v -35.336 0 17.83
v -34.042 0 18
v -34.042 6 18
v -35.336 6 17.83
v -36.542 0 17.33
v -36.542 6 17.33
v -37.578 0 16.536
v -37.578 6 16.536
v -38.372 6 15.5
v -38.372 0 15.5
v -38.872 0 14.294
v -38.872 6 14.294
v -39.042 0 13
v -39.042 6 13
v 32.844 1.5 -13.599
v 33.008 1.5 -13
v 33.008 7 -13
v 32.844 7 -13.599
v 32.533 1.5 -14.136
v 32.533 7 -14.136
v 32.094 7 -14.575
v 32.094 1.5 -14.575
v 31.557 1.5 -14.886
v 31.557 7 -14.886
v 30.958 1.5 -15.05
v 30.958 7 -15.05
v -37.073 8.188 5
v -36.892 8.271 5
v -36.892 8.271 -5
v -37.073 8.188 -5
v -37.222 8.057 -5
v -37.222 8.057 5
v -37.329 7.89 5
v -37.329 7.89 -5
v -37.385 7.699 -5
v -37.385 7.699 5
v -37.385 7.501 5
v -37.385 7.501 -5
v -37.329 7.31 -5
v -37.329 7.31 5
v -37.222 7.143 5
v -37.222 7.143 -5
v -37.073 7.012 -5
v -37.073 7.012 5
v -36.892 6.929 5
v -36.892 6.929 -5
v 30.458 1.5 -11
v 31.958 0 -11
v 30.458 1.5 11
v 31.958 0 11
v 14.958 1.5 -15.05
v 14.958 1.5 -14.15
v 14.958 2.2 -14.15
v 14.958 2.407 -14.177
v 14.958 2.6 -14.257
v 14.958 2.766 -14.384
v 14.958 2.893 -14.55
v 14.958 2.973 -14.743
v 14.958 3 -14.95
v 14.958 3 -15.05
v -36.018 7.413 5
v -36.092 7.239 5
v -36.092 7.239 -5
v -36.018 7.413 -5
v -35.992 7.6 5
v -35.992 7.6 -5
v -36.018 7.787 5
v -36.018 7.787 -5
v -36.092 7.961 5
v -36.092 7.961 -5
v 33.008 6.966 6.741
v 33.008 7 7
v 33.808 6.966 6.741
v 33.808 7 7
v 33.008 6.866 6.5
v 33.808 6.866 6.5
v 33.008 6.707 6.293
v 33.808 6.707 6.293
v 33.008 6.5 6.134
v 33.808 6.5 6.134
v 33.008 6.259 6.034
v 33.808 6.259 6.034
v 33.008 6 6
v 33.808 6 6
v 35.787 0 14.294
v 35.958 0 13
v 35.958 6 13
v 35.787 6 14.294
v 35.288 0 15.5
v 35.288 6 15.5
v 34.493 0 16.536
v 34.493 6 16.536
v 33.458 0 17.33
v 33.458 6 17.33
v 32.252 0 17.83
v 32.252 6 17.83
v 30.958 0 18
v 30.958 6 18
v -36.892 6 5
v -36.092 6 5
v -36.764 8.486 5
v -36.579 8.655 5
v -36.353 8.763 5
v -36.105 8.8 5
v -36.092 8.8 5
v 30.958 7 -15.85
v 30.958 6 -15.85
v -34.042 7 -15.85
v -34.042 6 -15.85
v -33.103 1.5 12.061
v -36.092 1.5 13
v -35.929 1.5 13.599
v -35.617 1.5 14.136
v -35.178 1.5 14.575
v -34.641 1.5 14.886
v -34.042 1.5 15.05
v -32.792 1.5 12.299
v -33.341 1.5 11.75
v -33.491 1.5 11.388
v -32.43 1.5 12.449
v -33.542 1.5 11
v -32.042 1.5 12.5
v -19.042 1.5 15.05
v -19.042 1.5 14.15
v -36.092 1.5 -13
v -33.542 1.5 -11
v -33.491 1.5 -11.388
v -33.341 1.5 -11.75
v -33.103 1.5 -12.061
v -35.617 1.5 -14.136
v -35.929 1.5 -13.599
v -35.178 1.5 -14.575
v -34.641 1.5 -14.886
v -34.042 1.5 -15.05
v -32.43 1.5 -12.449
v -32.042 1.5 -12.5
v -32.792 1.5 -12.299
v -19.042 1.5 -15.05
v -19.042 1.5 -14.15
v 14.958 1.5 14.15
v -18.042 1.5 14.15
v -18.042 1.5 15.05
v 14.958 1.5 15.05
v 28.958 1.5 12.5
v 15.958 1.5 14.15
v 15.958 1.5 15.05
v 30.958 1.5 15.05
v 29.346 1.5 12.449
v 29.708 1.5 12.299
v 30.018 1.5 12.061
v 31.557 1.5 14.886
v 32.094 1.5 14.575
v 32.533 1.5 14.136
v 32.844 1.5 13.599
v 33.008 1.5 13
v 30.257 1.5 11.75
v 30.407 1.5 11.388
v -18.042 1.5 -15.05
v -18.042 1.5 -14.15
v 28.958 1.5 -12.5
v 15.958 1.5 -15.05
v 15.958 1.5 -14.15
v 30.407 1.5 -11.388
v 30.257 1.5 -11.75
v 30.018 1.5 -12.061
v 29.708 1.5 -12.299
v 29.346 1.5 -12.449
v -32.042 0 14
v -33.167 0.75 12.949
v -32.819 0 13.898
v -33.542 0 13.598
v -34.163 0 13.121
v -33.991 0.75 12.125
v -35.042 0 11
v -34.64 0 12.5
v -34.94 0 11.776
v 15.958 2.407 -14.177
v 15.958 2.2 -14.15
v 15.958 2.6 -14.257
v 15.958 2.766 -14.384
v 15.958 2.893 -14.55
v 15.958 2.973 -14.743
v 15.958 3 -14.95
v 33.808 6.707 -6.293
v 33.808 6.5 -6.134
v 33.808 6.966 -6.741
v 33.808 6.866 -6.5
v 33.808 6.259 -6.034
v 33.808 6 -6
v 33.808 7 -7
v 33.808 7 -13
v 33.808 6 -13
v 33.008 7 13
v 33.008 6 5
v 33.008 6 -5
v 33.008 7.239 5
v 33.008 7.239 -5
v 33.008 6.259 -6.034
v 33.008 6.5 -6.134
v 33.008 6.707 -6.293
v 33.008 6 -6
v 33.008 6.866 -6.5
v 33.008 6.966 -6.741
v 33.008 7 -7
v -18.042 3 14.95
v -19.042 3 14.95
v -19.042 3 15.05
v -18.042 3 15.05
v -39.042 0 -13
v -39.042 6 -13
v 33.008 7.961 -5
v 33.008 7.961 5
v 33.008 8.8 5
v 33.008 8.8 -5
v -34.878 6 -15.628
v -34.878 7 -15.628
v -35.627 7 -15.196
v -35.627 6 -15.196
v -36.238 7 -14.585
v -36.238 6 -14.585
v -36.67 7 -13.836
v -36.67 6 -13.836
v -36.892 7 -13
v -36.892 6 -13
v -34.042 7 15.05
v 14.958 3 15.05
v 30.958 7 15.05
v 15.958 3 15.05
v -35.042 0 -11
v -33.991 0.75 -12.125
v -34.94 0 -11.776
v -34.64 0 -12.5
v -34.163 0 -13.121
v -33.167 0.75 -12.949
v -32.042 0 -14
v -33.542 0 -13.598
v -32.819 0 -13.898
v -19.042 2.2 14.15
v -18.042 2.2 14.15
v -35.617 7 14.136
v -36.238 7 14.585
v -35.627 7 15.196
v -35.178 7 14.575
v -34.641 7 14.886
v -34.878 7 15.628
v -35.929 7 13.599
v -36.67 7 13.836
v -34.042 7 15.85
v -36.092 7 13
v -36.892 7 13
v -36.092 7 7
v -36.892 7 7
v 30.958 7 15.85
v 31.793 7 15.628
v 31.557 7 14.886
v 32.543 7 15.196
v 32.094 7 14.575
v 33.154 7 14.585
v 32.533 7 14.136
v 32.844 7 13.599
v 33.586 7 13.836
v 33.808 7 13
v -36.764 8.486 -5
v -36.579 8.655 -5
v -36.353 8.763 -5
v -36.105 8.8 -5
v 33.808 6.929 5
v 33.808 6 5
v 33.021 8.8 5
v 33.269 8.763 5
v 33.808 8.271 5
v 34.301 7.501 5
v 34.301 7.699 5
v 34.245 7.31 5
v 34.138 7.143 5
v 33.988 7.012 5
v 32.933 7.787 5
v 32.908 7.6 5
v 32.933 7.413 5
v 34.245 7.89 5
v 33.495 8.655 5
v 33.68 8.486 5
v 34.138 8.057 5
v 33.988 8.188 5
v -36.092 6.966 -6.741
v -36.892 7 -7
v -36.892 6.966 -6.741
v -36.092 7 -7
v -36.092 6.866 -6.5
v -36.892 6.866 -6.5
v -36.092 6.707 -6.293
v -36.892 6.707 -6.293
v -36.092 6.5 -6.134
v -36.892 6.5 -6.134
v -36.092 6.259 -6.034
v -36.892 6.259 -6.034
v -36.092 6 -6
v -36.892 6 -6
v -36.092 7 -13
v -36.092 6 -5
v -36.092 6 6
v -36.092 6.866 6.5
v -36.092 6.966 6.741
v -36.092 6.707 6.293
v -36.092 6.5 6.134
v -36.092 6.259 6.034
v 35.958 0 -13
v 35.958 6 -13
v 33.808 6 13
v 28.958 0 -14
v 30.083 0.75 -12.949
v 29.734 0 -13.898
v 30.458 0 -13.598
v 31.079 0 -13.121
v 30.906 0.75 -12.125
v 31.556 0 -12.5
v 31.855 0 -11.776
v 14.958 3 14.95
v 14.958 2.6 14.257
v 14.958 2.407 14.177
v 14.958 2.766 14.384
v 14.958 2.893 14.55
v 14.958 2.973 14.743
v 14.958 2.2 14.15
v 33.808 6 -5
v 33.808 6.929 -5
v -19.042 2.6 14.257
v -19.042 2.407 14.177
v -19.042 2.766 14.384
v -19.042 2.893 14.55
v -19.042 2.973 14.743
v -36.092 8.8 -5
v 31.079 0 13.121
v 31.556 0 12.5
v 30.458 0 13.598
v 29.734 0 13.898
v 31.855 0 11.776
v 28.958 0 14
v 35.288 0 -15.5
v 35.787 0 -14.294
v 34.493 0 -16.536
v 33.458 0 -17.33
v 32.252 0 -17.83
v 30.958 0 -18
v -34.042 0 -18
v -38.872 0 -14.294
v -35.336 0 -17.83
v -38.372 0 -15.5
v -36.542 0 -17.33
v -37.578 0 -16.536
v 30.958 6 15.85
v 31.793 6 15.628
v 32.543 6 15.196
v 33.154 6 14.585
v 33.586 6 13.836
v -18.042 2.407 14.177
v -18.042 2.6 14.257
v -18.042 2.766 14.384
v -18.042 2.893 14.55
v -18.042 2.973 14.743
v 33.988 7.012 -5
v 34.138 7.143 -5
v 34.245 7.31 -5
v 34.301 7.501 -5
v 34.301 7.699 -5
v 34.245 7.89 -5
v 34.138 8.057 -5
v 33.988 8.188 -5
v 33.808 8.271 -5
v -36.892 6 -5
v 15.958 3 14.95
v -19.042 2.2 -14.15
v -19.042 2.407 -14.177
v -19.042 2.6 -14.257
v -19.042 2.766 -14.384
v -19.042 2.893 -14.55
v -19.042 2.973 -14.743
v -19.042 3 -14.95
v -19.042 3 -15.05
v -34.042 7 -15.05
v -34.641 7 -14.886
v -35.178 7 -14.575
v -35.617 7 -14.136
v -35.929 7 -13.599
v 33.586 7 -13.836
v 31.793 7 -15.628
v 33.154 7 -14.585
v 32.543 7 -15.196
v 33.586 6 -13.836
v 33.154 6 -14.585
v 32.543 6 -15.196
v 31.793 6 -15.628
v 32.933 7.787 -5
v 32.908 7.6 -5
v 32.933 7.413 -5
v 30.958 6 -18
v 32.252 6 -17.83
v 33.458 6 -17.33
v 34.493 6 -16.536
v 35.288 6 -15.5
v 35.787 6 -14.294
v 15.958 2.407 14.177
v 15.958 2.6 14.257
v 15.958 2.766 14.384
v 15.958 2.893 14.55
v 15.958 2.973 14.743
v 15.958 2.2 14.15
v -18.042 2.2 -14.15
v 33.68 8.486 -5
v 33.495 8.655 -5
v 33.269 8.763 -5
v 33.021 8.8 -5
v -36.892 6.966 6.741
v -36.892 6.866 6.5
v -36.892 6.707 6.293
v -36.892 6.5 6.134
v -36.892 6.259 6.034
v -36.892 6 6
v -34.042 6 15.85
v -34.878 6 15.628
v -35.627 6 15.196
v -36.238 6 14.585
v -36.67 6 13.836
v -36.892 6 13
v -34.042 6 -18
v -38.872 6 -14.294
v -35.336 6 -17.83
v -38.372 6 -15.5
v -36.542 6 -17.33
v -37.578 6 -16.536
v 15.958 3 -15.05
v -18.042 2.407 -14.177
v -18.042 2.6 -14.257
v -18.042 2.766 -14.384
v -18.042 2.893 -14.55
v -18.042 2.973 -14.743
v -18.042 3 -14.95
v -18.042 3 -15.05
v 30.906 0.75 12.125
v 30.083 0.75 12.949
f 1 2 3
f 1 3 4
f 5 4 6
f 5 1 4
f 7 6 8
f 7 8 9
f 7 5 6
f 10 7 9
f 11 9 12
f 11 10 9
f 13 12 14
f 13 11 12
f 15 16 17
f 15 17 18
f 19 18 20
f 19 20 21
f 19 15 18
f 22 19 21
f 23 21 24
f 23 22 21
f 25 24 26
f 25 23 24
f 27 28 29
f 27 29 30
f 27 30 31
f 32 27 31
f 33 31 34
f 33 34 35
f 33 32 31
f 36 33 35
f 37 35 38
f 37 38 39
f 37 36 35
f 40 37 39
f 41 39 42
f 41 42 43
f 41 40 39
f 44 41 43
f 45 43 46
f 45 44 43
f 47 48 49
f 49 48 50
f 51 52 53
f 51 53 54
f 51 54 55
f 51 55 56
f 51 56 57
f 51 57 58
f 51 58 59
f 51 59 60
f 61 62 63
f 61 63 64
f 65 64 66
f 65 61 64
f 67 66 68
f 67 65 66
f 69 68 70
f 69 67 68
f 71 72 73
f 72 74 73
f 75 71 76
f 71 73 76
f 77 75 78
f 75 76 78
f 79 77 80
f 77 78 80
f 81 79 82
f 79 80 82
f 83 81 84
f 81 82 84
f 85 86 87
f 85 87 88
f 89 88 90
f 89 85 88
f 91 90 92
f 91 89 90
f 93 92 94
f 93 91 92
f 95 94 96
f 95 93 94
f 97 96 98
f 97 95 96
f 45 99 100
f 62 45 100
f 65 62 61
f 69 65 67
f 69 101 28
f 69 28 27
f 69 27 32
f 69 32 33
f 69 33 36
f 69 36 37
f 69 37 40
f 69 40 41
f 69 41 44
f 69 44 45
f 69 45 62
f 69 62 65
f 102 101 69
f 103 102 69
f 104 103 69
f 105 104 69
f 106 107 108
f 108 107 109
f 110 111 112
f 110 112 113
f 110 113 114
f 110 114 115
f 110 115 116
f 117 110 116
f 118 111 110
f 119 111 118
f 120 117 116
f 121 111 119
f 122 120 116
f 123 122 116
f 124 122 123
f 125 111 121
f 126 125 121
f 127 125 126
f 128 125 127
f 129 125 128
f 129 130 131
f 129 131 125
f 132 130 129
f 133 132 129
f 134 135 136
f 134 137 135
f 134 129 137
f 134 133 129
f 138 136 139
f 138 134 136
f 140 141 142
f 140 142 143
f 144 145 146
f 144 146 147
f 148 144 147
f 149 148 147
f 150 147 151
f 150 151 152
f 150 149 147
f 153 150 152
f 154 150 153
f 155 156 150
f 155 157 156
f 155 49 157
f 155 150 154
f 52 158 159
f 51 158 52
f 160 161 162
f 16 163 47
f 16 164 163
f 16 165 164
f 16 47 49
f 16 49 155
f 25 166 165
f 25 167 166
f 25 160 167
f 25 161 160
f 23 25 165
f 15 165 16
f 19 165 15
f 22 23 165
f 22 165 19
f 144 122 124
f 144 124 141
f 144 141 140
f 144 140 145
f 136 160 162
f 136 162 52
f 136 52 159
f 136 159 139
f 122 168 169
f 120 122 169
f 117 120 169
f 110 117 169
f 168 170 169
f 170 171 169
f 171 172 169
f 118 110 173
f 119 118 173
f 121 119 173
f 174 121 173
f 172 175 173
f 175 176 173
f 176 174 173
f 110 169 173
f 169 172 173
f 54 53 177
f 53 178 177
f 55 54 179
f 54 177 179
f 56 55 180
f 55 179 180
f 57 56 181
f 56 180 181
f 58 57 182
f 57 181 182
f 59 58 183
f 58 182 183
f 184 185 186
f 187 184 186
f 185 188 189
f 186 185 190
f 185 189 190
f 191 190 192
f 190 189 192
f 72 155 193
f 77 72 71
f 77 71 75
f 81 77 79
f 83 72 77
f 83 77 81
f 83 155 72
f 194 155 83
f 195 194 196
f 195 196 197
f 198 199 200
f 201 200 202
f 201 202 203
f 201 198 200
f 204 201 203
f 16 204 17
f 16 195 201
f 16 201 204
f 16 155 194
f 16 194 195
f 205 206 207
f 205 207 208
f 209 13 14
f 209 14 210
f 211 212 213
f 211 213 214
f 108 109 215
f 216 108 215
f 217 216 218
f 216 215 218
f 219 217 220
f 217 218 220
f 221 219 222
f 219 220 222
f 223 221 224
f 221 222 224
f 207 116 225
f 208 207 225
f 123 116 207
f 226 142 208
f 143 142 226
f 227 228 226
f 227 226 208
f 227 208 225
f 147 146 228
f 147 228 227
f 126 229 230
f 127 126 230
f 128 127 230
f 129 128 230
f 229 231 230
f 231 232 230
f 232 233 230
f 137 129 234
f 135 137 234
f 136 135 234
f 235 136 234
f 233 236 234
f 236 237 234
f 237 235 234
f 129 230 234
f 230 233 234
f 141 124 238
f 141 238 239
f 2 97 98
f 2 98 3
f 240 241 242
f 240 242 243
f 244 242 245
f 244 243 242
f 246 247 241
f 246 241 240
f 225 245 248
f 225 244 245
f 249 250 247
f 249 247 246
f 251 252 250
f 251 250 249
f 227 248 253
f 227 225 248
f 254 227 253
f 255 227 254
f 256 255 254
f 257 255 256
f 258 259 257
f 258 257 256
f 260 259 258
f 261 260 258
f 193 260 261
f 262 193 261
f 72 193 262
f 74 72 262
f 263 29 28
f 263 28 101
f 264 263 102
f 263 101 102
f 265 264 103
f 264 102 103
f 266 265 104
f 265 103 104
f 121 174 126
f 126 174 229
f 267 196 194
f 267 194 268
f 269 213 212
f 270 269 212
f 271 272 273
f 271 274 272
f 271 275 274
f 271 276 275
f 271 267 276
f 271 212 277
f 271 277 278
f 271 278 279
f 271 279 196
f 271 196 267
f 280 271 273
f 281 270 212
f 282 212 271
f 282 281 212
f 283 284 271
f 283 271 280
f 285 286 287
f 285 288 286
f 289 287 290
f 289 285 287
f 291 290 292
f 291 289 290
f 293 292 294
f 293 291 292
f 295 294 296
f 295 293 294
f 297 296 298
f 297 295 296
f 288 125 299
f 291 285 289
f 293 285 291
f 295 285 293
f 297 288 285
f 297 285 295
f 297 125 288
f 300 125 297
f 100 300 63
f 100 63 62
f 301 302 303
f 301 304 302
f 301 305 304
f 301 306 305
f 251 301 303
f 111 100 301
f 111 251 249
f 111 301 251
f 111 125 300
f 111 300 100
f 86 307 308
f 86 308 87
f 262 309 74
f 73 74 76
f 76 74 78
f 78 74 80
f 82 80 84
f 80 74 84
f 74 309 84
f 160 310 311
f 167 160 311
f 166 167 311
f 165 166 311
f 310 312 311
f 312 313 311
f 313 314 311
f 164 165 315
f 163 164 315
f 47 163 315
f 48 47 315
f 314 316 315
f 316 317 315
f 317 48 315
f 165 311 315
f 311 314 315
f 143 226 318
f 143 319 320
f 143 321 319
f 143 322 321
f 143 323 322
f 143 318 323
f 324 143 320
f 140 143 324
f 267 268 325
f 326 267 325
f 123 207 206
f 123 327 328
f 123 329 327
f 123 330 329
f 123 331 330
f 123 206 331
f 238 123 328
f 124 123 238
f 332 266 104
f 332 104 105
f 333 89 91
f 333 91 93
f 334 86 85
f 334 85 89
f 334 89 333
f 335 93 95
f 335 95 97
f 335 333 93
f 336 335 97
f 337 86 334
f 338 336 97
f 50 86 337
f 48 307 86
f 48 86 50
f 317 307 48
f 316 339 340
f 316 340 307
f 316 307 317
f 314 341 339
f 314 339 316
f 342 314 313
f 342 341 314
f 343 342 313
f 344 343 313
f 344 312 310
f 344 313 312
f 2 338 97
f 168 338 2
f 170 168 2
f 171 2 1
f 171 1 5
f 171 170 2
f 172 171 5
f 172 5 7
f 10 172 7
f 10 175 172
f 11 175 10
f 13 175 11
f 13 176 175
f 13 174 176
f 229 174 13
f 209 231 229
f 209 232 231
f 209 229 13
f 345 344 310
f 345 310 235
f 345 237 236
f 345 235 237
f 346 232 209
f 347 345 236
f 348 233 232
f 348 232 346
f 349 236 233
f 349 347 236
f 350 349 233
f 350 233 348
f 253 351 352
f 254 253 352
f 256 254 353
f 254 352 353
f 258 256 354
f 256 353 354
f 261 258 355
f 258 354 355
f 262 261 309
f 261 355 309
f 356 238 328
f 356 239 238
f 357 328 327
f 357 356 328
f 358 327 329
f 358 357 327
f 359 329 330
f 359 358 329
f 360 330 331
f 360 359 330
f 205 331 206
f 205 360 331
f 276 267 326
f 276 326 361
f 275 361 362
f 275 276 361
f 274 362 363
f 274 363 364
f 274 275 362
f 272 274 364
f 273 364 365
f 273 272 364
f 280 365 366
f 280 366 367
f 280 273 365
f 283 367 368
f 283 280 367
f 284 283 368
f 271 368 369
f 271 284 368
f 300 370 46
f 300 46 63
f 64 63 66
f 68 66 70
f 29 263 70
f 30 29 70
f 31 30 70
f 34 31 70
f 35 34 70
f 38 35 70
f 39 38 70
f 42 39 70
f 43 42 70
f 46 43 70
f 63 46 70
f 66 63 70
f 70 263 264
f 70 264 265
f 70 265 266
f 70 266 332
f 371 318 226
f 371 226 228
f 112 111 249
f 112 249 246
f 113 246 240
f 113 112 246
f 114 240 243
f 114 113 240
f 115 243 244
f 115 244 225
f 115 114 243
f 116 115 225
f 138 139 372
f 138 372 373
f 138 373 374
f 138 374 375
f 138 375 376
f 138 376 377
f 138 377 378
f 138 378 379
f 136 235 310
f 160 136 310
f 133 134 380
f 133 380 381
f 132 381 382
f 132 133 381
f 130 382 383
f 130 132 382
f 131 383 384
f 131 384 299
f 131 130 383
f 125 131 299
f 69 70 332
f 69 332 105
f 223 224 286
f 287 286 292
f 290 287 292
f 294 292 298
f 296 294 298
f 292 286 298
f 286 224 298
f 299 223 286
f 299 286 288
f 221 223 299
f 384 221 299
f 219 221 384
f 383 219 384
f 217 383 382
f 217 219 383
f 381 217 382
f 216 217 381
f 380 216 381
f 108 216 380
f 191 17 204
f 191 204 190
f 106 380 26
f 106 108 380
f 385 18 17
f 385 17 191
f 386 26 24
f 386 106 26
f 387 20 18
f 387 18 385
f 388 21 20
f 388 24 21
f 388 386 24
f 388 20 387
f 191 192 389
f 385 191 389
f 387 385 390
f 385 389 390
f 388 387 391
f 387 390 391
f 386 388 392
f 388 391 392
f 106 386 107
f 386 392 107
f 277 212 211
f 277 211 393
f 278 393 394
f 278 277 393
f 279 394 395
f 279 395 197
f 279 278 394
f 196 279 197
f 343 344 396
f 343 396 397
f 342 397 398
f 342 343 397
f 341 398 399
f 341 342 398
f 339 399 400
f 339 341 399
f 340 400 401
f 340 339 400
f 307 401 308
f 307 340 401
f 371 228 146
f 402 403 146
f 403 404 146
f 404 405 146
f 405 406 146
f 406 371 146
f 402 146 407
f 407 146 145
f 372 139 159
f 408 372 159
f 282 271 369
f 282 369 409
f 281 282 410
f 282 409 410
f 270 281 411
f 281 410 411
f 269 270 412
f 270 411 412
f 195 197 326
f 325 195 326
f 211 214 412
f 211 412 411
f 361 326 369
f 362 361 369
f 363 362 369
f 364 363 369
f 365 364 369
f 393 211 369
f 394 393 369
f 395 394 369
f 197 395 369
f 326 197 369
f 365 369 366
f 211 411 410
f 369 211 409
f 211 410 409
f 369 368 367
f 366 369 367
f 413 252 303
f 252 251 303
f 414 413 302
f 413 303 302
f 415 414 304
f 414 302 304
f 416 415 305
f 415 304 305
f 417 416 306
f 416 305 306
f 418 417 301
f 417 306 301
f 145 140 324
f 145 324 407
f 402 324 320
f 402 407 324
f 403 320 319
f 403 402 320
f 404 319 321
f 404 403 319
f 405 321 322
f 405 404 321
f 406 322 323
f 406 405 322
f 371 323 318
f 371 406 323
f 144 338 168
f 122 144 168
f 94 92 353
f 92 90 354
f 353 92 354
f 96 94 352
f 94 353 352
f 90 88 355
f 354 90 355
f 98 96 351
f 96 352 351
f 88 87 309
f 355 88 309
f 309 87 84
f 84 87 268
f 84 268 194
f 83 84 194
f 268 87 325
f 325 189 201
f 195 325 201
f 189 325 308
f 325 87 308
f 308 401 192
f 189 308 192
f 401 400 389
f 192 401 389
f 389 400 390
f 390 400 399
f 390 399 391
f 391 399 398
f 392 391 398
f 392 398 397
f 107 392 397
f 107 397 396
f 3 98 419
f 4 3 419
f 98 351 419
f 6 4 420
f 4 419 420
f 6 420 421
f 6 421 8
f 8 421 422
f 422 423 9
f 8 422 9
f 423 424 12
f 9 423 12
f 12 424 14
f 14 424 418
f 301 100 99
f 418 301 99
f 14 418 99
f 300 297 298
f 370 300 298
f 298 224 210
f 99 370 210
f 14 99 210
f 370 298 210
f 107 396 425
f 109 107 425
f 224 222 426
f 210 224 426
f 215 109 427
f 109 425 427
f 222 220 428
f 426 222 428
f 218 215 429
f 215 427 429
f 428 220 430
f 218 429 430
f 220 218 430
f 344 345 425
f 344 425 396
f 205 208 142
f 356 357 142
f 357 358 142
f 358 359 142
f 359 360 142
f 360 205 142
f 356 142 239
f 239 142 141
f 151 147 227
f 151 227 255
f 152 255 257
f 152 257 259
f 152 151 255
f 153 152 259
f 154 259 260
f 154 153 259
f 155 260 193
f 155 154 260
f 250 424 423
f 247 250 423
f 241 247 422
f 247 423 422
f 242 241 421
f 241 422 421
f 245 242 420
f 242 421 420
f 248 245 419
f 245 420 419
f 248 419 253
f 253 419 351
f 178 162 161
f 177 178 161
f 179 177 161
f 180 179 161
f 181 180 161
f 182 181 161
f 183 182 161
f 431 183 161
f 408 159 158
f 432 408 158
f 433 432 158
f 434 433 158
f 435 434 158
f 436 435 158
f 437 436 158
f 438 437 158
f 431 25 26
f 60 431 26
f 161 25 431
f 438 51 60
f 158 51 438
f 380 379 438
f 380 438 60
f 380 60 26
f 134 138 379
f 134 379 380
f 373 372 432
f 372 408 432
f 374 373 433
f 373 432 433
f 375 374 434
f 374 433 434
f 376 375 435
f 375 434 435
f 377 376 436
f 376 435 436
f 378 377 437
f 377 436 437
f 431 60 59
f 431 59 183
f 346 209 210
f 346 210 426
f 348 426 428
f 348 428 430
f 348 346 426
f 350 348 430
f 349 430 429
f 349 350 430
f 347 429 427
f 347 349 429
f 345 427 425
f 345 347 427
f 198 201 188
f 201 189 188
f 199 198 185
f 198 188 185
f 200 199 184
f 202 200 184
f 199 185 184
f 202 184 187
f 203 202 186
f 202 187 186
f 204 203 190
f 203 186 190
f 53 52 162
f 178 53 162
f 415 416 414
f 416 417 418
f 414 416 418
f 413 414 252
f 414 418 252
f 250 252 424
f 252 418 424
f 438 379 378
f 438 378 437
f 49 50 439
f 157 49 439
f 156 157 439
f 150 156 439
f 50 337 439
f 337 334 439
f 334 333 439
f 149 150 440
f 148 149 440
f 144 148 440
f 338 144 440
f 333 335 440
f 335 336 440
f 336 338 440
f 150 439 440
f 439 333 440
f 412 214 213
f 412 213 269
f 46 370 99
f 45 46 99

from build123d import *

# Parameters (mm, degrees)
EXTRUDE_2_DEPTH     = 6
EXTRUDE_4_DEPTH     = 1
SKETCH_7_W          = 0.8
SKETCH_7_H          = 10
EXTRUDE_8_DEPTH     = 2.8
SKETCH_8_R          = 0.7
EXTRUDE_9_DEPTH     = 10
FILLET_1_R          = 0.85
SKETCH_11_W         = 1
SKETCH_11_H         = 1
CUT_EXTRUDE_1_DEPTH = 1.2
FILLET_2_R          = 1
SKETCH_13_W         = 0.8
SKETCH_13_H         = 10
EXTRUDE_10_DEPTH    = 1.8
SKETCH_14_R         = 0.7
EXTRUDE_11_DEPTH    = 10
FILLET_3_R          = 0.85
SKETCH_15_W         = 0.8
SKETCH_15_H         = 1
CUT_EXTRUDE_3_DEPTH = 1
FILLET_4_R          = 1
CUT_EXTRUDE_START   = -4.5
CUT_EXTRUDE_4_DEPTH = 4.5
SKETCH_17_W         = 64
SKETCH_17_H         = 25
CUT_EXTRUDE_5_DEPTH = 1.5
FILLET_5_R          = 1.5
SKETCH_20_W         = 1
SKETCH_20_H         = 0.9
EXTRUDE_14_DEPTH    = 1.5
FILLET_8_R          = 0.8
CHAMFER_3_SIZE      = 1.5


# Some blends are built 0.0001 mm under size
with BuildPart() as part:
    # case 2 → 凸台-拉伸2 (new body)
    with BuildSketch(Plane(origin=(0, 0, 0), x_dir=(1, 0, 0), z_dir=(0, 1, 0))):
        with BuildLine():
            Line((-34.042196447, 18), (30.957803553, 18))
            ThreePointArc((30.957803553, 18), (34.493337459, 16.535533906), (35.957803553, 13))
            Line((35.957803553, 13), (35.957803553, -13))
            ThreePointArc((35.957803553, -13), (34.493337459, -16.535533906), (30.957803553, -18))
            Line((30.957803553, -18), (-34.042196447, -18))
            ThreePointArc((-34.042196447, -18), (-37.577730353, -16.535533906), (-39.042196447, -13))
            Line((-39.042196447, -13), (-39.042196447, 13))
            ThreePointArc((-39.042196447, 13), (-37.577730353, 16.535533906), (-34.042196447, 18))
        make_face()
    extrude(amount=EXTRUDE_2_DEPTH)

    # 草图3 → 凸台-拉伸4 (add)
    with BuildSketch(Plane(origin=(0, 6, 0), x_dir=(1, 0, 0), z_dir=(0, 1, 0))):
        with BuildLine():
            Line((-36.892196447, 13), (-36.892196447, -13))
            ThreePointArc((-36.892196447, -13), (-35.952846076, -14.910649629), (-34.042196447, -15.85))
            Line((-34.042196447, -15.85), (30.957803553, -15.85))
            ThreePointArc((30.957803553, -15.85), (32.868453181, -14.910649629), (33.807803553, -13))
            Line((33.807803553, -13), (33.807803553, 13))
            ThreePointArc((33.807803553, 13), (32.868453181, 14.910649629), (30.957803553, 15.85))
            Line((30.957803553, 15.85), (-34.042196447, 15.85))
            ThreePointArc((-34.042196447, 15.85), (-35.952846076, 14.910649629), (-36.892196447, 13))
        make_face()
        with BuildLine():
            Line((-34.042196447, -15.05), (30.957803553, -15.05))
            ThreePointArc((30.957803553, -15.05), (32.327315928, -14.369512375), (33.007803553, -13))
            Line((33.007803553, -13), (33.007803553, 13))
            ThreePointArc((33.007803553, 13), (32.327315928, 14.369512375), (30.957803553, 15.05))
            Line((30.957803553, 15.05), (-34.042196447, 15.05))
            ThreePointArc((-34.042196447, 15.05), (-35.411708823, 14.369512375), (-36.092196447, 13))
            Line((-36.092196447, 13), (-36.092196447, -13))
            ThreePointArc((-36.092196447, -13), (-35.411708823, -14.369512375), (-34.042196447, -15.05))
        make_face(mode=Mode.SUBTRACT)
    extrude(amount=EXTRUDE_4_DEPTH)

    # 草图7 → 凸台-拉伸8 (add)
    with BuildSketch(Plane(origin=(0, 6, 0), x_dir=(1, 0, 0), z_dir=(0, 1, 0))):
        with Locations((-36.492196447, 0)):
            Rectangle(SKETCH_7_W, SKETCH_7_H)
    extrude(amount=EXTRUDE_8_DEPTH)

    # 草图8 → 凸台-拉伸9 (add)
    with BuildSketch(Plane.XY.offset(5)):
        with Locations((-36.692196447, 7.6)):
            Circle(SKETCH_8_R)
    extrude(amount=-EXTRUDE_9_DEPTH)

    # 圆角1
    # the kernel refuses this fillet: 0.85 mm, written as the material it takes off along each edge
    with BuildSketch(Plane(origin=(-36.892196447, 8.8, 6.967826014), x_dir=(0, -1, 0), z_dir=(0, 0, -1))) as fillet_1_piece_1:
        with BuildLine():
            CenterArc((0.85, -0.787130406), FILLET_1_R, 112.174937704, 67.825062296)
            Line((0, -0.787130406), (-0.017, -0.787130406))
            Line((-0.017, -0.787130406), (-0.017, 0))
            Line((-0.017, 0), (0, 0.017))
            ThreePointArc((0, 0.017), (0.264589803, 0.017), (0.522763199, 0.015742608))
            Line((0.522763199, 0.015742608), (0.529179607, 0))
        make_face()
    extrude(amount=13.935652028, mode=Mode.SUBTRACT)

    # 草图11 → 切除-拉伸1 (cut)
    with BuildSketch(Plane.ZY.offset(36.892196447)):
        with Locations((5.5, 6.5)):
            Rectangle(SKETCH_11_W, SKETCH_11_H)
        with Locations((-5.5, 6.5)):
            Rectangle(SKETCH_11_W, SKETCH_11_H)
    extrude(amount=-CUT_EXTRUDE_1_DEPTH, mode=Mode.SUBTRACT)

    # 圆角2
    fillet_2_edges = [part.edges().sort_by_distance(p)[0] for p in [
        (-36.492196447, 7, 6),
        (-36.492196447, 7, -6),
    ]]
    fillet(fillet_2_edges, radius=FILLET_2_R - 0.0001)  # a hair under: the kernel refuses the full size

    # 草图13 → 凸台-拉伸10 (add)
    with BuildSketch(Plane(origin=(0, 7, 0), x_dir=(1, 0, 0), z_dir=(0, 1, 0))):
        with Locations((33.407803553, 0)):
            Rectangle(SKETCH_13_W, SKETCH_13_H)
    extrude(amount=EXTRUDE_10_DEPTH)

    # 草图14 → 凸台-拉伸11 (add)
    with BuildSketch(Plane.XY.offset(5)):
        with Locations((33.607803553, 7.6)):
            Circle(SKETCH_14_R)
    extrude(amount=-EXTRUDE_11_DEPTH)

    # 圆角3
    # the kernel refuses this fillet: 0.85 mm, written as the material it takes off along each edge
    with BuildSketch(Plane(origin=(33.807803553, 8.8, -6.967826014), x_dir=(0, -1, 0), z_dir=(0, 0, 1))) as fillet_3_piece_1:
        with BuildLine():
            CenterArc((0.85, -0.787130406), FILLET_3_R, 112.174937704, 67.825062296)
            Line((0, -0.787130406), (-0.017, -0.787130406))
            Line((-0.017, -0.787130406), (-0.017, 0))
            Line((-0.017, 0), (0, 0.017))
            ThreePointArc((0, 0.017), (0.264589803, 0.017), (0.522763199, 0.015742608))
            Line((0.522763199, 0.015742608), (0.529179607, 0))
        make_face()
    extrude(amount=13.935652028, mode=Mode.SUBTRACT)

    # 草图15 → 切除-拉伸3 (cut)
    with BuildSketch(Plane(origin=(0, 7, 0), x_dir=(1, 0, 0), z_dir=(0, 1, 0))):
        with Locations((33.407803553, 5.5)):
            Rectangle(SKETCH_15_W, SKETCH_15_H)
        with Locations((33.407803553, -5.5)):
            Rectangle(SKETCH_15_W, SKETCH_15_H)
    extrude(amount=-CUT_EXTRUDE_3_DEPTH, mode=Mode.SUBTRACT)

    # 圆角4
    fillet_4_edges = [part.edges().sort_by_distance(p)[0] for p in [
        (33.407803553, 7, 6),
        (33.407803553, 7, -6),
    ]]
    fillet(fillet_4_edges, radius=FILLET_4_R - 0.0001)  # a hair under: the kernel refuses the full size

    # 草图16 → 切除-拉伸4 (cut)
    with BuildSketch(Plane(origin=(0, 6, 0), x_dir=(1, 0, 0), z_dir=(0, 1, 0)).offset(CUT_EXTRUDE_START)):
        with BuildLine():
            Line((-34.042196447, -15.05), (30.957803553, -15.05))
            ThreePointArc((30.957803553, -15.05), (32.327315928, -14.369512375), (33.007803553, -13))
            Line((33.007803553, -13), (33.007803553, 13))
            ThreePointArc((33.007803553, 13), (32.327315928, 14.369512375), (30.957803553, 15.05))
            Line((30.957803553, 15.05), (-34.042196447, 15.05))
            ThreePointArc((-34.042196447, 15.05), (-35.411708823, 14.369512375), (-36.092196447, 13))
            Line((-36.092196447, 13), (-36.092196447, -13))
            ThreePointArc((-36.092196447, -13), (-35.411708823, -14.369512375), (-34.042196447, -15.05))
        make_face()
    extrude(amount=CUT_EXTRUDE_4_DEPTH, mode=Mode.SUBTRACT)

    # 草图17 → 切除-拉伸5 (cut)
    with BuildSketch(Plane(origin=(0, 1.5, 0), x_dir=(1, 0, 0), z_dir=(0, 1, 0))):
        with Locations((-1.542196447, 0)):
            Rectangle(SKETCH_17_W, SKETCH_17_H)
    extrude(amount=-CUT_EXTRUDE_5_DEPTH, mode=Mode.SUBTRACT)

    # 圆角5
    fillet_5_edges = [part.edges().sort_by_distance(p)[0] for p in [
        (-33.542196447, 0.75, 12.5),
        (-33.542196447, 0.75, -12.5),
        (30.457803553, 0.75, -12.5),
        (30.457803553, 0.75, 12.5),
    ]]
    fillet(fillet_5_edges, radius=FILLET_5_R)

    # 草图20 → 凸台-拉伸14 (add)
    with BuildSketch(Plane(origin=(0, 1.5, 0), x_dir=(1, 0, 0), z_dir=(0, 1, 0))):
        with Locations((-18.542196447, 14.6)):
            Rectangle(SKETCH_20_W, SKETCH_20_H)
        with Locations((15.457803553, 14.6)):
            Rectangle(SKETCH_20_W, SKETCH_20_H)
        with Locations((-18.542196447, -14.6)):
            Rectangle(SKETCH_20_W, SKETCH_20_H)
        with Locations((15.457803553, -14.6)):
            Rectangle(SKETCH_20_W, SKETCH_20_H)
    extrude(amount=EXTRUDE_14_DEPTH)

    # 圆角8
    fillet_8_edges = [part.edges().sort_by_distance(p)[0] for p in [
        (-18.542196447, 3, -14.15),
        (15.457803553, 3, -14.15),
        (-18.542196447, 3, 14.15),
        (15.457803553, 3, 14.15),
    ]]
    fillet(fillet_8_edges, radius=FILLET_8_R)

    # 倒角3
    chamfer_3_edges = [part.edges().sort_by_distance(p)[0] for p in [
        (-1.542196447, 0, -12.5),
        (-33.102856619, 0, -12.060660172),
        (30.018463725, 0, -12.060660172),
        (-33.542196447, 0, 0),
        (30.457803553, 0, 0),
        (-33.102856619, 0, 12.060660172),
        (30.018463725, 0, 12.060660172),
        (-1.542196447, 0, 12.5),
    ]]
    chamfer(chamfer_3_edges, length=CHAMFER_3_SIZE - 0.0001)  # a hair under: the kernel refuses the full size


solid = part.part
